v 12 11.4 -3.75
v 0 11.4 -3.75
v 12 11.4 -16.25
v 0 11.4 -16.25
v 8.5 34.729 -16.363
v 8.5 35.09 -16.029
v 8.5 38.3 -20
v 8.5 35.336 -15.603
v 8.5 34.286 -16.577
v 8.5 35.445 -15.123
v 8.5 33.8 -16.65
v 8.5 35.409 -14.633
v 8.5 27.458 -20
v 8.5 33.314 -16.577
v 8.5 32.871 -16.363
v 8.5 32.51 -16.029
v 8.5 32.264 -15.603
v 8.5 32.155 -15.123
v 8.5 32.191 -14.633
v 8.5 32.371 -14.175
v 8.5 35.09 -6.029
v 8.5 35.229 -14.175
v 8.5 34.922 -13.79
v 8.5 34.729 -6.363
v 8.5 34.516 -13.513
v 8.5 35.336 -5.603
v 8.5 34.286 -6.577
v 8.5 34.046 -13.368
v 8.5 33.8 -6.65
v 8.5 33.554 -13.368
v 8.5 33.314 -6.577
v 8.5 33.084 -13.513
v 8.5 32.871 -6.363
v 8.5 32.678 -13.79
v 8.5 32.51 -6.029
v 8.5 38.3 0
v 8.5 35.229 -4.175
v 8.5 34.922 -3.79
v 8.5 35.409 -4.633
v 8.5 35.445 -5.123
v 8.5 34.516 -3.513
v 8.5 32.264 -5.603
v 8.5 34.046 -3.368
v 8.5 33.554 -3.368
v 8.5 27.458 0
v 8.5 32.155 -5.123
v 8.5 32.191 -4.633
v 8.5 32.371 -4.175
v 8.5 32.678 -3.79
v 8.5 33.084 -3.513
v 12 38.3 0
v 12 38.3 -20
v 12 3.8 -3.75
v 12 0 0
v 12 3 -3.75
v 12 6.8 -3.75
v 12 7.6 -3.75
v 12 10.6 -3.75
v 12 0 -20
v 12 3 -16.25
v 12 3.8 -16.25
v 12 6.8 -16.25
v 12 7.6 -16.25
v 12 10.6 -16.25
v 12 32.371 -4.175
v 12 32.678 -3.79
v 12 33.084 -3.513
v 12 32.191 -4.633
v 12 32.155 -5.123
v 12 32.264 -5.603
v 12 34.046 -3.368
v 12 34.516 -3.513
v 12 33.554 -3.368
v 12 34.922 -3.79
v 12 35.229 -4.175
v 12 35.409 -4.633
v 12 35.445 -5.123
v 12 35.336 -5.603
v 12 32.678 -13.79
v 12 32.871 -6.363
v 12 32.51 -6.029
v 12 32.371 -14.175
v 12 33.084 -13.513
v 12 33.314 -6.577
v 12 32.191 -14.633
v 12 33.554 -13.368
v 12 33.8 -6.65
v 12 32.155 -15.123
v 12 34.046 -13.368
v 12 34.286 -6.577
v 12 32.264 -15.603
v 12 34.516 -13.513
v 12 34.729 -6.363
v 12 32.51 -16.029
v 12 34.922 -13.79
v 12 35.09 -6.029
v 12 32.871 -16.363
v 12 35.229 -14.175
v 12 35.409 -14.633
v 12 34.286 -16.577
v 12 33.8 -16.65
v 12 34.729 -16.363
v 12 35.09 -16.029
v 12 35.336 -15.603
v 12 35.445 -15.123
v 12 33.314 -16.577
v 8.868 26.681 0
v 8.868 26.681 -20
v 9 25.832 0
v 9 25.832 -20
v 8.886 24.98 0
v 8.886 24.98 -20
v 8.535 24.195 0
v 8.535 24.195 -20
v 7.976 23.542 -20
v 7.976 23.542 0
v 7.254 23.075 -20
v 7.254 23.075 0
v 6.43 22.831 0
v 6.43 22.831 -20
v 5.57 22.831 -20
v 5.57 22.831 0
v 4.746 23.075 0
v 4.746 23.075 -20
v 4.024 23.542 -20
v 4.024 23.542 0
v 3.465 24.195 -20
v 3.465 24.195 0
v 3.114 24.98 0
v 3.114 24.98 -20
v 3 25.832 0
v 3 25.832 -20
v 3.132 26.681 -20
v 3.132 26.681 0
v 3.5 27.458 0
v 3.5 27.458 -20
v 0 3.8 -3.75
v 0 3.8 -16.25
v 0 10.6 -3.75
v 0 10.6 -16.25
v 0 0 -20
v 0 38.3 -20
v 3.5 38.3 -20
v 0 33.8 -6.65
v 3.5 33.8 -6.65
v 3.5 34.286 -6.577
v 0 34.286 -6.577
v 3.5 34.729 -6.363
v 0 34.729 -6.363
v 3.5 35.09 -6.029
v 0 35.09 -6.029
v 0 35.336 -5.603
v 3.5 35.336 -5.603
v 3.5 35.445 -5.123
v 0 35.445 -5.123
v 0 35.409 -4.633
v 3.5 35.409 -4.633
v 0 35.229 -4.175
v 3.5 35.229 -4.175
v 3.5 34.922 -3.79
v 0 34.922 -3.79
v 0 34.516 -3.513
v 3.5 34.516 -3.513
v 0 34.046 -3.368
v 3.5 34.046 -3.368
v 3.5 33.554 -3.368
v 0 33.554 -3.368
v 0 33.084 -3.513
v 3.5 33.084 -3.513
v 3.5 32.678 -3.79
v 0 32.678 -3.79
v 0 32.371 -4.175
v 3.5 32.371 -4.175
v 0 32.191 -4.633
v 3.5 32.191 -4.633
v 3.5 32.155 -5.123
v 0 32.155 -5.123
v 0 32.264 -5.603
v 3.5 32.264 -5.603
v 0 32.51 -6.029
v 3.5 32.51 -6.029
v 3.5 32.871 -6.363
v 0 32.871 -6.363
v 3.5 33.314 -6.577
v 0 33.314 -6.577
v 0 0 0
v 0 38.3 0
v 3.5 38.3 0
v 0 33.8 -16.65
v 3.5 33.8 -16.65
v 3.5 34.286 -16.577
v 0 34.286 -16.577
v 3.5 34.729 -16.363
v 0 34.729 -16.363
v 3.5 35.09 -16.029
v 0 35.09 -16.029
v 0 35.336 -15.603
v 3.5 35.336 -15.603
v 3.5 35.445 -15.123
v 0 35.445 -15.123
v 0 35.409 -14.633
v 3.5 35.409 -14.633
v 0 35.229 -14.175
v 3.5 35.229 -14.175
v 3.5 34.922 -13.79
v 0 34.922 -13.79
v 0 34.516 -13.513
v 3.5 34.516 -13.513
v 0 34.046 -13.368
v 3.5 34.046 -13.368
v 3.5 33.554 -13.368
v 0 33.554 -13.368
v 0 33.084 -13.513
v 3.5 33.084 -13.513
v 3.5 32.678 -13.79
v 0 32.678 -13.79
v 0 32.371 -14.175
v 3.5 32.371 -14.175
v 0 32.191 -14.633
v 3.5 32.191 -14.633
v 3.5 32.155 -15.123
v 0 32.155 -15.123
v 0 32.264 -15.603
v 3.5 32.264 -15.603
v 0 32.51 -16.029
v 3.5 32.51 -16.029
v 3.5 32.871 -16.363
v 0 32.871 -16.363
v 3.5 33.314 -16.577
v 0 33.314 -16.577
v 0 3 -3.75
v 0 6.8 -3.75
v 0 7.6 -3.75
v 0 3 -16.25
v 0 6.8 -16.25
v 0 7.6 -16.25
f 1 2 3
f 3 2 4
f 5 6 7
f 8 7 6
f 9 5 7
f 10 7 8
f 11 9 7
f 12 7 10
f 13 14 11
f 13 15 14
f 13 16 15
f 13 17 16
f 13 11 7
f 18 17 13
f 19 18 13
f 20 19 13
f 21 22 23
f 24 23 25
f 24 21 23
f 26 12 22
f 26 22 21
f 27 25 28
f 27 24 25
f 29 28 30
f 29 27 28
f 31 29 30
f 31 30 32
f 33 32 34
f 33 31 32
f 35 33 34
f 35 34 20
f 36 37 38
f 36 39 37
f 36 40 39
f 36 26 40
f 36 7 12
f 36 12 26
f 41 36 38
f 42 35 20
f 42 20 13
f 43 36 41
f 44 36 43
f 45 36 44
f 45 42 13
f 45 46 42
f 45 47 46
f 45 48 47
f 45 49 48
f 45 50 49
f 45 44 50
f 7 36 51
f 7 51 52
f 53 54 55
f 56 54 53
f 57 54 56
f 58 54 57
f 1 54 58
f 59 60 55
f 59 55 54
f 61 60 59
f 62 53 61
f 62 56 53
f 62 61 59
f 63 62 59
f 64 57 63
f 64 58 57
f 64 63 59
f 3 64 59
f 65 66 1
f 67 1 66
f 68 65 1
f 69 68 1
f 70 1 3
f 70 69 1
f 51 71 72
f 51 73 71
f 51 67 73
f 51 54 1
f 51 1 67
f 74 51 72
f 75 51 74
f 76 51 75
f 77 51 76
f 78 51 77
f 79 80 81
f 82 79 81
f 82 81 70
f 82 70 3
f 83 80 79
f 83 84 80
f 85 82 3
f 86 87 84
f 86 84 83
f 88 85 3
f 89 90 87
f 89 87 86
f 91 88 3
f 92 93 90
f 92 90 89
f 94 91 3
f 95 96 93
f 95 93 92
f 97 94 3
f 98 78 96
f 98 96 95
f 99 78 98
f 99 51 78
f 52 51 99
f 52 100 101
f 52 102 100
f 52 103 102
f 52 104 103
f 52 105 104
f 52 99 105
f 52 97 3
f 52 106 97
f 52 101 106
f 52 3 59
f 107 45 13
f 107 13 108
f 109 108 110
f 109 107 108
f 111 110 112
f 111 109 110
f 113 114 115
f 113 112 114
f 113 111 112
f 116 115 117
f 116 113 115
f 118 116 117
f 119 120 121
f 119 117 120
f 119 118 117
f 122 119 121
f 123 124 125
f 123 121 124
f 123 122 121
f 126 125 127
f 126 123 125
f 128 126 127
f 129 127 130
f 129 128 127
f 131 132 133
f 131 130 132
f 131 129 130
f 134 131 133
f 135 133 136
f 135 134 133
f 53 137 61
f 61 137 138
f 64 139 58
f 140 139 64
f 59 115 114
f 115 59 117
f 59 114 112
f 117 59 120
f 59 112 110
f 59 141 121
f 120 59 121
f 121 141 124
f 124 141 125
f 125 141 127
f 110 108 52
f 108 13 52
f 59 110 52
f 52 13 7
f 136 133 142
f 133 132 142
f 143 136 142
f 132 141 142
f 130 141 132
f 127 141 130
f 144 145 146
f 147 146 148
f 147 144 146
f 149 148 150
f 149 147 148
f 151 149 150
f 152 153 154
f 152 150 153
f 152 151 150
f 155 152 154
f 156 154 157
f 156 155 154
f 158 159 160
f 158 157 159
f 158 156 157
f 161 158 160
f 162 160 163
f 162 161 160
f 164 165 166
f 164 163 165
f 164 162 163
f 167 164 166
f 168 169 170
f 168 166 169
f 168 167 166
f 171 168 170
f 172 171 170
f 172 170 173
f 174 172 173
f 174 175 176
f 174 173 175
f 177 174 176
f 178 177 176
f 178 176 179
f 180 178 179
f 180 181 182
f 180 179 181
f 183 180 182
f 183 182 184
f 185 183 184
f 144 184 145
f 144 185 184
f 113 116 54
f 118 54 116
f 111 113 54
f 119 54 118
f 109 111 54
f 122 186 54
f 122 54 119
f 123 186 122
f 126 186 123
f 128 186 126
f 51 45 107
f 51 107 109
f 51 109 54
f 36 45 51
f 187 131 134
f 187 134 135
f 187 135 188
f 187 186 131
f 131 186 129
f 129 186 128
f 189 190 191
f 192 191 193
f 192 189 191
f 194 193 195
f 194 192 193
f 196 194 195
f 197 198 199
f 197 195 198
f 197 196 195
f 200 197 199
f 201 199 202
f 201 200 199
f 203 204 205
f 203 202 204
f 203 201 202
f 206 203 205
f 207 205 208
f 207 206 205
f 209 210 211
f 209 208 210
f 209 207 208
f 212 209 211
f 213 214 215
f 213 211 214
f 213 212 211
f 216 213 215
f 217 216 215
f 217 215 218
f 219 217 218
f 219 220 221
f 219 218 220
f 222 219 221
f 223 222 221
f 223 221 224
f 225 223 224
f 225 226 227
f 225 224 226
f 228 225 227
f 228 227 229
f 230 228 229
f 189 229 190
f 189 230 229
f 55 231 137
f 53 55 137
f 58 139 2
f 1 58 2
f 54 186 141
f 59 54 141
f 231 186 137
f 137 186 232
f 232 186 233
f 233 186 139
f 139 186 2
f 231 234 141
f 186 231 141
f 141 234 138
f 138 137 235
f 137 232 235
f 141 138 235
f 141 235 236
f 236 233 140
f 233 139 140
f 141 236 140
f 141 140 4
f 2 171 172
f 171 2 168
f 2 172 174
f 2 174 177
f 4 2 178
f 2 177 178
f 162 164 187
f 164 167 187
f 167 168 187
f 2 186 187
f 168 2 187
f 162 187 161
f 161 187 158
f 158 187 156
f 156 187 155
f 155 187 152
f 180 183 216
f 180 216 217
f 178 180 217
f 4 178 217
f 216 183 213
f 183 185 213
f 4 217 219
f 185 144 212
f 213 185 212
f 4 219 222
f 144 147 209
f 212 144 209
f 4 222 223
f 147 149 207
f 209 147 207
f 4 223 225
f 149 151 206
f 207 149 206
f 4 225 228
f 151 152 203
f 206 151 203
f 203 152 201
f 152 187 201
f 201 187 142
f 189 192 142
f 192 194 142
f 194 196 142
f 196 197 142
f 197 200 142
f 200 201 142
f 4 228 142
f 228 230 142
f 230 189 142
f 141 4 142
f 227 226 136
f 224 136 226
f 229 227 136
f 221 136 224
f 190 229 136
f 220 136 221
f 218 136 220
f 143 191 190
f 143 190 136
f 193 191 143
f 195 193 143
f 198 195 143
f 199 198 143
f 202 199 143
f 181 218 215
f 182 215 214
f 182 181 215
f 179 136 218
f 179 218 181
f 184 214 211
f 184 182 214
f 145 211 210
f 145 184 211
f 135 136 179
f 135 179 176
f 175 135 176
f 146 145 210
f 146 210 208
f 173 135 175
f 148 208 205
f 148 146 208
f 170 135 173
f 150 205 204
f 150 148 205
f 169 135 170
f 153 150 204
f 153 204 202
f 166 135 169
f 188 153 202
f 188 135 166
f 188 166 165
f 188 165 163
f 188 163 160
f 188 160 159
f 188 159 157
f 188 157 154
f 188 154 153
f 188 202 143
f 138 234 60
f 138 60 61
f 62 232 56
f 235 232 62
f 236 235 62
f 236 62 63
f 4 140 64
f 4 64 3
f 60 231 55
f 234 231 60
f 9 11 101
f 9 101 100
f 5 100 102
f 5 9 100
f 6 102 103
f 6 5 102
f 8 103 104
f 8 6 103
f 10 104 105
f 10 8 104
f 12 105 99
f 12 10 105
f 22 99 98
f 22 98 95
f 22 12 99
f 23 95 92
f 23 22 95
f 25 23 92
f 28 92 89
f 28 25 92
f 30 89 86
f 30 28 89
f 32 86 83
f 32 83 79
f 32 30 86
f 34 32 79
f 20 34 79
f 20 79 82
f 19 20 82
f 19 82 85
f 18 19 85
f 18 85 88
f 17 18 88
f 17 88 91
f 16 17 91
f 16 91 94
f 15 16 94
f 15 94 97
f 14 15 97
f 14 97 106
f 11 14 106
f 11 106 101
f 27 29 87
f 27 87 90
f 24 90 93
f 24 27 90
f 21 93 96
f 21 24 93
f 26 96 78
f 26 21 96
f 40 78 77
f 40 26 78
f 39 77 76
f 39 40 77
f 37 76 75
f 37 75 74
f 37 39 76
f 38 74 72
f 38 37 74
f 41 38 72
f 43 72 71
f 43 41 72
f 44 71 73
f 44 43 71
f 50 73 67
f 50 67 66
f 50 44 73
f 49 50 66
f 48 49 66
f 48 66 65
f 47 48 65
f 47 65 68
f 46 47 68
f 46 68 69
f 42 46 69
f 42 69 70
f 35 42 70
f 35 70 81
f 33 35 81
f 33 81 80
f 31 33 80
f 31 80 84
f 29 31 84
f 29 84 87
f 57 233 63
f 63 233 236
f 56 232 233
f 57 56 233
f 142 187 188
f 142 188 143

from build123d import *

# Parameters (mm, degrees)
SKIZZE1_W                       = 20
SKIZZE1_H                       = 38.3
SKIZZE1_R                       = 1.65
SKIZZE1_W_2                     = 12.5
SKIZZE1_H_2                     = 0.8
AUFSATZ_LINEAR_AUSTRAGEN1_DEPTH = 12
SCHNITT_LINEAR_AUSTRAGEN2_DEPTH = 45.842948164


with BuildPart() as part:
    # Skizze1 → Aufsatz-Linear austragen1 (new body)
    with BuildSketch(Plane(origin=(0, 0, 0), x_dir=(0, 0, -1), z_dir=(1, 0, 0))):
        with Locations((10, 19.15)):
            Rectangle(SKIZZE1_W, SKIZZE1_H)
        with Locations((5, 33.8)):
            Circle(SKIZZE1_R, mode=Mode.SUBTRACT)
        with Locations((15, 33.8)):
            Circle(SKIZZE1_R, mode=Mode.SUBTRACT)
        with Locations((10, 3.4)):
            Rectangle(SKIZZE1_W_2, SKIZZE1_H_2, mode=Mode.SUBTRACT)
        with Locations((10, 7.2)):
            Rectangle(SKIZZE1_W_2, SKIZZE1_H_2, mode=Mode.SUBTRACT)
        with Locations((10, 11)):
            Rectangle(SKIZZE1_W_2, SKIZZE1_H_2, mode=Mode.SUBTRACT)
    extrude(amount=AUFSATZ_LINEAR_AUSTRAGEN1_DEPTH)

    # Skizze2 → Schnitt-Linear austragen2 (cut, through all)
    with BuildSketch(Plane.XY):
        with BuildLine():
            Line((3.5, 38.3), (8.5, 38.3))
            Line((8.5, 38.3), (8.5, 27.458312395))
            ThreePointArc((8.5, 27.458312395), (6, 22.8), (3.5, 27.458312395))
            Line((3.5, 27.458312395), (3.5, 38.3))
        make_face()
    extrude(amount=-SCHNITT_LINEAR_AUSTRAGEN2_DEPTH, mode=Mode.SUBTRACT)


solid = part.part
